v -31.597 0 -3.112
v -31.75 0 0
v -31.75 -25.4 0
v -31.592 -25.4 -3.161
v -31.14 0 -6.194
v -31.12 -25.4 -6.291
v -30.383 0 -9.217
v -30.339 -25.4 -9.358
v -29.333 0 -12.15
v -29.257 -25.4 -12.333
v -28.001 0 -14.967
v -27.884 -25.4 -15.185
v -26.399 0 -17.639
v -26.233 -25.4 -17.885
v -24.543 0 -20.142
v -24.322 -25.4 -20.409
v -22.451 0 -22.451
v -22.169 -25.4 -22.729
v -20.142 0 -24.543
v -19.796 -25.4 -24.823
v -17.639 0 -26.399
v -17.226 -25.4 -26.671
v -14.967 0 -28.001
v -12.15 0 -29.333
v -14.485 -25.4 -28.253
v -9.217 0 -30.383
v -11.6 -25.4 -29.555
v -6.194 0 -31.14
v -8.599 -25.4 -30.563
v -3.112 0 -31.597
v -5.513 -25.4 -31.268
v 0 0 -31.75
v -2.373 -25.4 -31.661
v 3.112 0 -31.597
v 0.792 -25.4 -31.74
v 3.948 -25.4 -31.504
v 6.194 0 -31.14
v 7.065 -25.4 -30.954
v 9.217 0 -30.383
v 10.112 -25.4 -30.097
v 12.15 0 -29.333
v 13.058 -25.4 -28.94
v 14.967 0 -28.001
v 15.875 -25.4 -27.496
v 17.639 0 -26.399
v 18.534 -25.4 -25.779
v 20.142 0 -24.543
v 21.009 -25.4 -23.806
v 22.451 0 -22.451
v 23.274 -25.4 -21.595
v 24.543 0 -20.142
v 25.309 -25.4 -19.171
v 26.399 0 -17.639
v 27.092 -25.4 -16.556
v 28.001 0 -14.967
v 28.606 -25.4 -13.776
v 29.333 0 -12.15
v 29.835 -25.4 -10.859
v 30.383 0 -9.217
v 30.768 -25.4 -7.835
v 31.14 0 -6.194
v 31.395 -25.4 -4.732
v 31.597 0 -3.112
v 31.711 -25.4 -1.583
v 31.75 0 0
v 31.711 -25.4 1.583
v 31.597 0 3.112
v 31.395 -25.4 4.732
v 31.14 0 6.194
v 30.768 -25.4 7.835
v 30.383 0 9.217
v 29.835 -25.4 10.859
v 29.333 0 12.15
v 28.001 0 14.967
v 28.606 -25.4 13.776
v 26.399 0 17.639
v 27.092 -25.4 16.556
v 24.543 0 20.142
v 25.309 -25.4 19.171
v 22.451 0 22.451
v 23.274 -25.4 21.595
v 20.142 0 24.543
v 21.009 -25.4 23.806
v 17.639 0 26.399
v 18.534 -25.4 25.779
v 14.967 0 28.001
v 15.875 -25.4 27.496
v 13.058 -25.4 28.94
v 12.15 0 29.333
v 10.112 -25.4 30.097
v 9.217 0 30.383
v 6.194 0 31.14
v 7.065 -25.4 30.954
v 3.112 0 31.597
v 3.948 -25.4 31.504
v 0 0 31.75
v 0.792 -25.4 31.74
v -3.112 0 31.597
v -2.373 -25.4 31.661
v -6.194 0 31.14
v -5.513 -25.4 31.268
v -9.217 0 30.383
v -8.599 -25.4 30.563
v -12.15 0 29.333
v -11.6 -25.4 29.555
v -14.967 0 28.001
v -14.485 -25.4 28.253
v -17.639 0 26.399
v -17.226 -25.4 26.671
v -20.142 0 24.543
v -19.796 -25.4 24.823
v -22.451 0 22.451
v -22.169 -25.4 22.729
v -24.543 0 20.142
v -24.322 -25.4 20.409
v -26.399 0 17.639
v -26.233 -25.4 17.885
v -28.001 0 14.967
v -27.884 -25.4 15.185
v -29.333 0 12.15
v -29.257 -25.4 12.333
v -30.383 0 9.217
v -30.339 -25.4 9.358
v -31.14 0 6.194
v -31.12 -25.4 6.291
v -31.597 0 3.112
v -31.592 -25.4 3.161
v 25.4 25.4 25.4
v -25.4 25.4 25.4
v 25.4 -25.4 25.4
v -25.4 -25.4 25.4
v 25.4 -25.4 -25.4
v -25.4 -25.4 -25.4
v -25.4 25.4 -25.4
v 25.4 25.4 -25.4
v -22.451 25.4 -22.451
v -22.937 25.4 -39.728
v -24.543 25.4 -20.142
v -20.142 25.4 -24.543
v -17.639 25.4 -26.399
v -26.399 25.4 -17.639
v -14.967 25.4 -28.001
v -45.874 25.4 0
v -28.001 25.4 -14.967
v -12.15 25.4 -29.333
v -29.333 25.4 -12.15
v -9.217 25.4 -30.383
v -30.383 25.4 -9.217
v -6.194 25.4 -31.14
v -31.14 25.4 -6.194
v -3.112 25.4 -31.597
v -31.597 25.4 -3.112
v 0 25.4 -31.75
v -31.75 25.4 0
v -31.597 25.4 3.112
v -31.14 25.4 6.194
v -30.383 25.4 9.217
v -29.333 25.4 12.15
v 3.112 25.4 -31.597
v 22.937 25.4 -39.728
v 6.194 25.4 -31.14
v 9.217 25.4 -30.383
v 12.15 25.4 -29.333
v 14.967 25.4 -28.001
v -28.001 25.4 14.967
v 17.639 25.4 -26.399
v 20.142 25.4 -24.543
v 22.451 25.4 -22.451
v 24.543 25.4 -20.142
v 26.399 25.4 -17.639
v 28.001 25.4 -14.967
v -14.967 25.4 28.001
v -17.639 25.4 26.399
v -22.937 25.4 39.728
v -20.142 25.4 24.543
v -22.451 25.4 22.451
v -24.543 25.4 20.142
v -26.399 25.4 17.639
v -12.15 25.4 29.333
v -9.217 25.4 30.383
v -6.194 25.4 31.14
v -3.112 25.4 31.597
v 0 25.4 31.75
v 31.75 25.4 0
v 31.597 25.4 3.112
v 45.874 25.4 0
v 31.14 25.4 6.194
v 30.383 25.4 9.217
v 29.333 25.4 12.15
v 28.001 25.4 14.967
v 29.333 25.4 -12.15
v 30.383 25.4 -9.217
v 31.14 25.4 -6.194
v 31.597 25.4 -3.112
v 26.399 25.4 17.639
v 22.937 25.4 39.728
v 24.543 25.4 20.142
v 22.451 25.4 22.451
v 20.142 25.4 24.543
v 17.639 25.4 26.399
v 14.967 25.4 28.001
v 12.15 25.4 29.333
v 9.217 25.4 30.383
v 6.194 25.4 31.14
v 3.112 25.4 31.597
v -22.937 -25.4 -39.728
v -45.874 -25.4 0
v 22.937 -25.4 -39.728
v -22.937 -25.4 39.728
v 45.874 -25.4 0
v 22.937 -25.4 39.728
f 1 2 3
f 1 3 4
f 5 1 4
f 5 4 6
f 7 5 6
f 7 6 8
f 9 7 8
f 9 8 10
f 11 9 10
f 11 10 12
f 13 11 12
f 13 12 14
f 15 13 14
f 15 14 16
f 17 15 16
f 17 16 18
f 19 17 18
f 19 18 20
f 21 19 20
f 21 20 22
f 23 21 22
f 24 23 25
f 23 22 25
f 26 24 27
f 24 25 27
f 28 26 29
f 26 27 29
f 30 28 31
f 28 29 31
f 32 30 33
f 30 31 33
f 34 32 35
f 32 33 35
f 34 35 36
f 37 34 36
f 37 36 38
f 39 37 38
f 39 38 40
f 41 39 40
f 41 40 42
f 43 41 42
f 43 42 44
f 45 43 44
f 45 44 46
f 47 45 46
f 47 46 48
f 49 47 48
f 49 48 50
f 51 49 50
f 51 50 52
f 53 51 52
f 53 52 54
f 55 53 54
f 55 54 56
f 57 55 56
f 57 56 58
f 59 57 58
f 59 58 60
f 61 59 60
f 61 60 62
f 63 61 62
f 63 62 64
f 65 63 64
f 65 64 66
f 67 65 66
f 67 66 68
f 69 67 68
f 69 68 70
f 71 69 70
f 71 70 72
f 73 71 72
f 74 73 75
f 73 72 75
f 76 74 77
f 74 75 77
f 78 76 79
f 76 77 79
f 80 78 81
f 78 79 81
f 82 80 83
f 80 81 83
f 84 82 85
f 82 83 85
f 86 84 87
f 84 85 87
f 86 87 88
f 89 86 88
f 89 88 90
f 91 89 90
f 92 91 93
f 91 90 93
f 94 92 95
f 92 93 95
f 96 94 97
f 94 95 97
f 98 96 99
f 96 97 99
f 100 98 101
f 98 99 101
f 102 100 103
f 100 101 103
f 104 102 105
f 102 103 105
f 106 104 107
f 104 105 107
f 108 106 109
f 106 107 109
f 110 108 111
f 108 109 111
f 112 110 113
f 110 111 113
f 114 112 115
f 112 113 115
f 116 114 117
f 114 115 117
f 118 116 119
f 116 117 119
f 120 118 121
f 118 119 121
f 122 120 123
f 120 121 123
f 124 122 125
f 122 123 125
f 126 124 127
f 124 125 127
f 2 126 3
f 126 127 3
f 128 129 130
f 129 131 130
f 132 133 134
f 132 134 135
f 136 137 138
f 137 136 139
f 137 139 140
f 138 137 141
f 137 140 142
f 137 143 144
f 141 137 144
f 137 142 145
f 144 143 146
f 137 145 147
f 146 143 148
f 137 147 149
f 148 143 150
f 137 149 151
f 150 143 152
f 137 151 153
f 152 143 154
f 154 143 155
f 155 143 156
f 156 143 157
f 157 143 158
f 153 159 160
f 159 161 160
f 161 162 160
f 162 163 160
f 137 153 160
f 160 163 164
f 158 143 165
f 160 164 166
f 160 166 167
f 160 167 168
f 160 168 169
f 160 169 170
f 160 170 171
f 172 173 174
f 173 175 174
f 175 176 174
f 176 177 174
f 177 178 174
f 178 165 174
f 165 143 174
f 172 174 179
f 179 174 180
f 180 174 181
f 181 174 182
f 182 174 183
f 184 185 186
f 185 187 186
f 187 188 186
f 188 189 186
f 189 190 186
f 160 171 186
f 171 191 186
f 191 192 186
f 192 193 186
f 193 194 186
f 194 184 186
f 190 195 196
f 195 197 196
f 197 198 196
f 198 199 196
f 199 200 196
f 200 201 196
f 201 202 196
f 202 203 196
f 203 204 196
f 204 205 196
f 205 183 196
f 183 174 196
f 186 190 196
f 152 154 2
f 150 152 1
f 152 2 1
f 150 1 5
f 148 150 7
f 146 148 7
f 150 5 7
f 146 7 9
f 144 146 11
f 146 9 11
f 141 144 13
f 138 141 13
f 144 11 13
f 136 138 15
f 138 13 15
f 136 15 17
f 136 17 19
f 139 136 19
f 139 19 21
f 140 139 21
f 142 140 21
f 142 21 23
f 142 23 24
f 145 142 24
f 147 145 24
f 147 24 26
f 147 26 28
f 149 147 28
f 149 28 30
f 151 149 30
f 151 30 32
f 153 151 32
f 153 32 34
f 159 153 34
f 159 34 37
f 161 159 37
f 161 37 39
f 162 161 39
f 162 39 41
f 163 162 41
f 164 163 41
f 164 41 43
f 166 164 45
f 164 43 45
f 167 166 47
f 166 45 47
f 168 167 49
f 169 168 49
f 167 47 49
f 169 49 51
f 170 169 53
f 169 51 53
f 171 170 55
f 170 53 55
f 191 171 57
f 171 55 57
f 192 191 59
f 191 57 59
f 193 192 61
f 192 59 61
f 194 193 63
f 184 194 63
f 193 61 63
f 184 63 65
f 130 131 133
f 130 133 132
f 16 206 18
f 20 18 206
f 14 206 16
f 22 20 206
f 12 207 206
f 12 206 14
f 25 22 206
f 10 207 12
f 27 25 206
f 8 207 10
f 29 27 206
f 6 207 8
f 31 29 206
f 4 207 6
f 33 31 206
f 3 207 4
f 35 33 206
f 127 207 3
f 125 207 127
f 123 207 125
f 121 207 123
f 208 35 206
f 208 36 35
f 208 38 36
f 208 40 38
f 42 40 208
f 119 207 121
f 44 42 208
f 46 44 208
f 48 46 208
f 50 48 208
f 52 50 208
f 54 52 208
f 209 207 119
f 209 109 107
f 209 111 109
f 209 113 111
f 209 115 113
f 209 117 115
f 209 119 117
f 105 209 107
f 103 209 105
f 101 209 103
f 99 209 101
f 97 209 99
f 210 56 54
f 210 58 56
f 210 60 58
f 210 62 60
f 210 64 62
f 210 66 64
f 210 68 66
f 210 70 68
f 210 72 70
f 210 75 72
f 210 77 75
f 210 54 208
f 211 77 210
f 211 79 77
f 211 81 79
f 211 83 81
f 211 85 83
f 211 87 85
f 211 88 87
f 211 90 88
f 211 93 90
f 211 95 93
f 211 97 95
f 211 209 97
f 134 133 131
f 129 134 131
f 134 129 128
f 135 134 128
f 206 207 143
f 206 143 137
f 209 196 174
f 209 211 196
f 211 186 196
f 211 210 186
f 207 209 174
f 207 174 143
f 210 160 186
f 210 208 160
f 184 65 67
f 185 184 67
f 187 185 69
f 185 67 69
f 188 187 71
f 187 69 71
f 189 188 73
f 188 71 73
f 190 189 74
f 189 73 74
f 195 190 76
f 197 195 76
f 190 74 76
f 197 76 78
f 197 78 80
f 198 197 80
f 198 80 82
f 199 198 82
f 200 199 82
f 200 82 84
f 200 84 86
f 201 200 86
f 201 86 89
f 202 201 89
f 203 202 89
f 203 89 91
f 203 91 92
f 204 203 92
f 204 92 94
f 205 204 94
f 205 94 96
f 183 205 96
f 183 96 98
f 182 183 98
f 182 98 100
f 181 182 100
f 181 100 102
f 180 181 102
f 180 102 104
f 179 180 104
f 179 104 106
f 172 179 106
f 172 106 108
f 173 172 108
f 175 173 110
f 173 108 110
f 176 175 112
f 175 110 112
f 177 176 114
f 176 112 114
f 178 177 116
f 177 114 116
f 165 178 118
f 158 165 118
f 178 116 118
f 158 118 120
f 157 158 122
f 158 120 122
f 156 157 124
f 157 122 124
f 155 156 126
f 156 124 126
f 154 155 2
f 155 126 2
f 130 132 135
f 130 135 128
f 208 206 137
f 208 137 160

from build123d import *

# Parameters (mm, degrees)
F2_DEPTH = 25.4
F1_W     = 50.8
F1_H     = 50.8
F3_DEPTH = 25.4
F4_D     = 63.5
F4_DEPTH = 25.401
F5_D     = 63.5


with BuildPart() as f2:
    # F0 (on Front) → F2 (new body, symmetric)
    with BuildSketch(Plane.XZ):
        Polygon((22.9372407829, 39.7284664214), (-22.9372407829, 39.7284664214), (-45.8744815657, 0), (-22.9372407829, -39.7284664214), (22.9372407829, -39.7284664214), (45.8744815657, 0), align=None)
    extrude(amount=F2_DEPTH, both=True)

    # F4 (through all, one way)
    with BuildSketch(Plane.XZ):
        with Locations((0, 0)):
            Circle(F4_D / 2)
    extrude(amount=-F4_DEPTH, mode=Mode.SUBTRACT)

    # F5 (through all)
    with Locations(Plane(origin=(0, 0, 0), x_dir=(1, 0, 0), z_dir=(0, 1, 0))):
        with Locations((0, 0)):
            Hole(F5_D / 2)


with BuildPart() as f3:
    # F1 (on Front) → F3 (new body, symmetric)
    with BuildSketch(Plane.XZ):
        Rectangle(F1_W, F1_H)
    extrude(amount=F3_DEPTH, both=True)


solid = Compound([f2.part, f3.part])
